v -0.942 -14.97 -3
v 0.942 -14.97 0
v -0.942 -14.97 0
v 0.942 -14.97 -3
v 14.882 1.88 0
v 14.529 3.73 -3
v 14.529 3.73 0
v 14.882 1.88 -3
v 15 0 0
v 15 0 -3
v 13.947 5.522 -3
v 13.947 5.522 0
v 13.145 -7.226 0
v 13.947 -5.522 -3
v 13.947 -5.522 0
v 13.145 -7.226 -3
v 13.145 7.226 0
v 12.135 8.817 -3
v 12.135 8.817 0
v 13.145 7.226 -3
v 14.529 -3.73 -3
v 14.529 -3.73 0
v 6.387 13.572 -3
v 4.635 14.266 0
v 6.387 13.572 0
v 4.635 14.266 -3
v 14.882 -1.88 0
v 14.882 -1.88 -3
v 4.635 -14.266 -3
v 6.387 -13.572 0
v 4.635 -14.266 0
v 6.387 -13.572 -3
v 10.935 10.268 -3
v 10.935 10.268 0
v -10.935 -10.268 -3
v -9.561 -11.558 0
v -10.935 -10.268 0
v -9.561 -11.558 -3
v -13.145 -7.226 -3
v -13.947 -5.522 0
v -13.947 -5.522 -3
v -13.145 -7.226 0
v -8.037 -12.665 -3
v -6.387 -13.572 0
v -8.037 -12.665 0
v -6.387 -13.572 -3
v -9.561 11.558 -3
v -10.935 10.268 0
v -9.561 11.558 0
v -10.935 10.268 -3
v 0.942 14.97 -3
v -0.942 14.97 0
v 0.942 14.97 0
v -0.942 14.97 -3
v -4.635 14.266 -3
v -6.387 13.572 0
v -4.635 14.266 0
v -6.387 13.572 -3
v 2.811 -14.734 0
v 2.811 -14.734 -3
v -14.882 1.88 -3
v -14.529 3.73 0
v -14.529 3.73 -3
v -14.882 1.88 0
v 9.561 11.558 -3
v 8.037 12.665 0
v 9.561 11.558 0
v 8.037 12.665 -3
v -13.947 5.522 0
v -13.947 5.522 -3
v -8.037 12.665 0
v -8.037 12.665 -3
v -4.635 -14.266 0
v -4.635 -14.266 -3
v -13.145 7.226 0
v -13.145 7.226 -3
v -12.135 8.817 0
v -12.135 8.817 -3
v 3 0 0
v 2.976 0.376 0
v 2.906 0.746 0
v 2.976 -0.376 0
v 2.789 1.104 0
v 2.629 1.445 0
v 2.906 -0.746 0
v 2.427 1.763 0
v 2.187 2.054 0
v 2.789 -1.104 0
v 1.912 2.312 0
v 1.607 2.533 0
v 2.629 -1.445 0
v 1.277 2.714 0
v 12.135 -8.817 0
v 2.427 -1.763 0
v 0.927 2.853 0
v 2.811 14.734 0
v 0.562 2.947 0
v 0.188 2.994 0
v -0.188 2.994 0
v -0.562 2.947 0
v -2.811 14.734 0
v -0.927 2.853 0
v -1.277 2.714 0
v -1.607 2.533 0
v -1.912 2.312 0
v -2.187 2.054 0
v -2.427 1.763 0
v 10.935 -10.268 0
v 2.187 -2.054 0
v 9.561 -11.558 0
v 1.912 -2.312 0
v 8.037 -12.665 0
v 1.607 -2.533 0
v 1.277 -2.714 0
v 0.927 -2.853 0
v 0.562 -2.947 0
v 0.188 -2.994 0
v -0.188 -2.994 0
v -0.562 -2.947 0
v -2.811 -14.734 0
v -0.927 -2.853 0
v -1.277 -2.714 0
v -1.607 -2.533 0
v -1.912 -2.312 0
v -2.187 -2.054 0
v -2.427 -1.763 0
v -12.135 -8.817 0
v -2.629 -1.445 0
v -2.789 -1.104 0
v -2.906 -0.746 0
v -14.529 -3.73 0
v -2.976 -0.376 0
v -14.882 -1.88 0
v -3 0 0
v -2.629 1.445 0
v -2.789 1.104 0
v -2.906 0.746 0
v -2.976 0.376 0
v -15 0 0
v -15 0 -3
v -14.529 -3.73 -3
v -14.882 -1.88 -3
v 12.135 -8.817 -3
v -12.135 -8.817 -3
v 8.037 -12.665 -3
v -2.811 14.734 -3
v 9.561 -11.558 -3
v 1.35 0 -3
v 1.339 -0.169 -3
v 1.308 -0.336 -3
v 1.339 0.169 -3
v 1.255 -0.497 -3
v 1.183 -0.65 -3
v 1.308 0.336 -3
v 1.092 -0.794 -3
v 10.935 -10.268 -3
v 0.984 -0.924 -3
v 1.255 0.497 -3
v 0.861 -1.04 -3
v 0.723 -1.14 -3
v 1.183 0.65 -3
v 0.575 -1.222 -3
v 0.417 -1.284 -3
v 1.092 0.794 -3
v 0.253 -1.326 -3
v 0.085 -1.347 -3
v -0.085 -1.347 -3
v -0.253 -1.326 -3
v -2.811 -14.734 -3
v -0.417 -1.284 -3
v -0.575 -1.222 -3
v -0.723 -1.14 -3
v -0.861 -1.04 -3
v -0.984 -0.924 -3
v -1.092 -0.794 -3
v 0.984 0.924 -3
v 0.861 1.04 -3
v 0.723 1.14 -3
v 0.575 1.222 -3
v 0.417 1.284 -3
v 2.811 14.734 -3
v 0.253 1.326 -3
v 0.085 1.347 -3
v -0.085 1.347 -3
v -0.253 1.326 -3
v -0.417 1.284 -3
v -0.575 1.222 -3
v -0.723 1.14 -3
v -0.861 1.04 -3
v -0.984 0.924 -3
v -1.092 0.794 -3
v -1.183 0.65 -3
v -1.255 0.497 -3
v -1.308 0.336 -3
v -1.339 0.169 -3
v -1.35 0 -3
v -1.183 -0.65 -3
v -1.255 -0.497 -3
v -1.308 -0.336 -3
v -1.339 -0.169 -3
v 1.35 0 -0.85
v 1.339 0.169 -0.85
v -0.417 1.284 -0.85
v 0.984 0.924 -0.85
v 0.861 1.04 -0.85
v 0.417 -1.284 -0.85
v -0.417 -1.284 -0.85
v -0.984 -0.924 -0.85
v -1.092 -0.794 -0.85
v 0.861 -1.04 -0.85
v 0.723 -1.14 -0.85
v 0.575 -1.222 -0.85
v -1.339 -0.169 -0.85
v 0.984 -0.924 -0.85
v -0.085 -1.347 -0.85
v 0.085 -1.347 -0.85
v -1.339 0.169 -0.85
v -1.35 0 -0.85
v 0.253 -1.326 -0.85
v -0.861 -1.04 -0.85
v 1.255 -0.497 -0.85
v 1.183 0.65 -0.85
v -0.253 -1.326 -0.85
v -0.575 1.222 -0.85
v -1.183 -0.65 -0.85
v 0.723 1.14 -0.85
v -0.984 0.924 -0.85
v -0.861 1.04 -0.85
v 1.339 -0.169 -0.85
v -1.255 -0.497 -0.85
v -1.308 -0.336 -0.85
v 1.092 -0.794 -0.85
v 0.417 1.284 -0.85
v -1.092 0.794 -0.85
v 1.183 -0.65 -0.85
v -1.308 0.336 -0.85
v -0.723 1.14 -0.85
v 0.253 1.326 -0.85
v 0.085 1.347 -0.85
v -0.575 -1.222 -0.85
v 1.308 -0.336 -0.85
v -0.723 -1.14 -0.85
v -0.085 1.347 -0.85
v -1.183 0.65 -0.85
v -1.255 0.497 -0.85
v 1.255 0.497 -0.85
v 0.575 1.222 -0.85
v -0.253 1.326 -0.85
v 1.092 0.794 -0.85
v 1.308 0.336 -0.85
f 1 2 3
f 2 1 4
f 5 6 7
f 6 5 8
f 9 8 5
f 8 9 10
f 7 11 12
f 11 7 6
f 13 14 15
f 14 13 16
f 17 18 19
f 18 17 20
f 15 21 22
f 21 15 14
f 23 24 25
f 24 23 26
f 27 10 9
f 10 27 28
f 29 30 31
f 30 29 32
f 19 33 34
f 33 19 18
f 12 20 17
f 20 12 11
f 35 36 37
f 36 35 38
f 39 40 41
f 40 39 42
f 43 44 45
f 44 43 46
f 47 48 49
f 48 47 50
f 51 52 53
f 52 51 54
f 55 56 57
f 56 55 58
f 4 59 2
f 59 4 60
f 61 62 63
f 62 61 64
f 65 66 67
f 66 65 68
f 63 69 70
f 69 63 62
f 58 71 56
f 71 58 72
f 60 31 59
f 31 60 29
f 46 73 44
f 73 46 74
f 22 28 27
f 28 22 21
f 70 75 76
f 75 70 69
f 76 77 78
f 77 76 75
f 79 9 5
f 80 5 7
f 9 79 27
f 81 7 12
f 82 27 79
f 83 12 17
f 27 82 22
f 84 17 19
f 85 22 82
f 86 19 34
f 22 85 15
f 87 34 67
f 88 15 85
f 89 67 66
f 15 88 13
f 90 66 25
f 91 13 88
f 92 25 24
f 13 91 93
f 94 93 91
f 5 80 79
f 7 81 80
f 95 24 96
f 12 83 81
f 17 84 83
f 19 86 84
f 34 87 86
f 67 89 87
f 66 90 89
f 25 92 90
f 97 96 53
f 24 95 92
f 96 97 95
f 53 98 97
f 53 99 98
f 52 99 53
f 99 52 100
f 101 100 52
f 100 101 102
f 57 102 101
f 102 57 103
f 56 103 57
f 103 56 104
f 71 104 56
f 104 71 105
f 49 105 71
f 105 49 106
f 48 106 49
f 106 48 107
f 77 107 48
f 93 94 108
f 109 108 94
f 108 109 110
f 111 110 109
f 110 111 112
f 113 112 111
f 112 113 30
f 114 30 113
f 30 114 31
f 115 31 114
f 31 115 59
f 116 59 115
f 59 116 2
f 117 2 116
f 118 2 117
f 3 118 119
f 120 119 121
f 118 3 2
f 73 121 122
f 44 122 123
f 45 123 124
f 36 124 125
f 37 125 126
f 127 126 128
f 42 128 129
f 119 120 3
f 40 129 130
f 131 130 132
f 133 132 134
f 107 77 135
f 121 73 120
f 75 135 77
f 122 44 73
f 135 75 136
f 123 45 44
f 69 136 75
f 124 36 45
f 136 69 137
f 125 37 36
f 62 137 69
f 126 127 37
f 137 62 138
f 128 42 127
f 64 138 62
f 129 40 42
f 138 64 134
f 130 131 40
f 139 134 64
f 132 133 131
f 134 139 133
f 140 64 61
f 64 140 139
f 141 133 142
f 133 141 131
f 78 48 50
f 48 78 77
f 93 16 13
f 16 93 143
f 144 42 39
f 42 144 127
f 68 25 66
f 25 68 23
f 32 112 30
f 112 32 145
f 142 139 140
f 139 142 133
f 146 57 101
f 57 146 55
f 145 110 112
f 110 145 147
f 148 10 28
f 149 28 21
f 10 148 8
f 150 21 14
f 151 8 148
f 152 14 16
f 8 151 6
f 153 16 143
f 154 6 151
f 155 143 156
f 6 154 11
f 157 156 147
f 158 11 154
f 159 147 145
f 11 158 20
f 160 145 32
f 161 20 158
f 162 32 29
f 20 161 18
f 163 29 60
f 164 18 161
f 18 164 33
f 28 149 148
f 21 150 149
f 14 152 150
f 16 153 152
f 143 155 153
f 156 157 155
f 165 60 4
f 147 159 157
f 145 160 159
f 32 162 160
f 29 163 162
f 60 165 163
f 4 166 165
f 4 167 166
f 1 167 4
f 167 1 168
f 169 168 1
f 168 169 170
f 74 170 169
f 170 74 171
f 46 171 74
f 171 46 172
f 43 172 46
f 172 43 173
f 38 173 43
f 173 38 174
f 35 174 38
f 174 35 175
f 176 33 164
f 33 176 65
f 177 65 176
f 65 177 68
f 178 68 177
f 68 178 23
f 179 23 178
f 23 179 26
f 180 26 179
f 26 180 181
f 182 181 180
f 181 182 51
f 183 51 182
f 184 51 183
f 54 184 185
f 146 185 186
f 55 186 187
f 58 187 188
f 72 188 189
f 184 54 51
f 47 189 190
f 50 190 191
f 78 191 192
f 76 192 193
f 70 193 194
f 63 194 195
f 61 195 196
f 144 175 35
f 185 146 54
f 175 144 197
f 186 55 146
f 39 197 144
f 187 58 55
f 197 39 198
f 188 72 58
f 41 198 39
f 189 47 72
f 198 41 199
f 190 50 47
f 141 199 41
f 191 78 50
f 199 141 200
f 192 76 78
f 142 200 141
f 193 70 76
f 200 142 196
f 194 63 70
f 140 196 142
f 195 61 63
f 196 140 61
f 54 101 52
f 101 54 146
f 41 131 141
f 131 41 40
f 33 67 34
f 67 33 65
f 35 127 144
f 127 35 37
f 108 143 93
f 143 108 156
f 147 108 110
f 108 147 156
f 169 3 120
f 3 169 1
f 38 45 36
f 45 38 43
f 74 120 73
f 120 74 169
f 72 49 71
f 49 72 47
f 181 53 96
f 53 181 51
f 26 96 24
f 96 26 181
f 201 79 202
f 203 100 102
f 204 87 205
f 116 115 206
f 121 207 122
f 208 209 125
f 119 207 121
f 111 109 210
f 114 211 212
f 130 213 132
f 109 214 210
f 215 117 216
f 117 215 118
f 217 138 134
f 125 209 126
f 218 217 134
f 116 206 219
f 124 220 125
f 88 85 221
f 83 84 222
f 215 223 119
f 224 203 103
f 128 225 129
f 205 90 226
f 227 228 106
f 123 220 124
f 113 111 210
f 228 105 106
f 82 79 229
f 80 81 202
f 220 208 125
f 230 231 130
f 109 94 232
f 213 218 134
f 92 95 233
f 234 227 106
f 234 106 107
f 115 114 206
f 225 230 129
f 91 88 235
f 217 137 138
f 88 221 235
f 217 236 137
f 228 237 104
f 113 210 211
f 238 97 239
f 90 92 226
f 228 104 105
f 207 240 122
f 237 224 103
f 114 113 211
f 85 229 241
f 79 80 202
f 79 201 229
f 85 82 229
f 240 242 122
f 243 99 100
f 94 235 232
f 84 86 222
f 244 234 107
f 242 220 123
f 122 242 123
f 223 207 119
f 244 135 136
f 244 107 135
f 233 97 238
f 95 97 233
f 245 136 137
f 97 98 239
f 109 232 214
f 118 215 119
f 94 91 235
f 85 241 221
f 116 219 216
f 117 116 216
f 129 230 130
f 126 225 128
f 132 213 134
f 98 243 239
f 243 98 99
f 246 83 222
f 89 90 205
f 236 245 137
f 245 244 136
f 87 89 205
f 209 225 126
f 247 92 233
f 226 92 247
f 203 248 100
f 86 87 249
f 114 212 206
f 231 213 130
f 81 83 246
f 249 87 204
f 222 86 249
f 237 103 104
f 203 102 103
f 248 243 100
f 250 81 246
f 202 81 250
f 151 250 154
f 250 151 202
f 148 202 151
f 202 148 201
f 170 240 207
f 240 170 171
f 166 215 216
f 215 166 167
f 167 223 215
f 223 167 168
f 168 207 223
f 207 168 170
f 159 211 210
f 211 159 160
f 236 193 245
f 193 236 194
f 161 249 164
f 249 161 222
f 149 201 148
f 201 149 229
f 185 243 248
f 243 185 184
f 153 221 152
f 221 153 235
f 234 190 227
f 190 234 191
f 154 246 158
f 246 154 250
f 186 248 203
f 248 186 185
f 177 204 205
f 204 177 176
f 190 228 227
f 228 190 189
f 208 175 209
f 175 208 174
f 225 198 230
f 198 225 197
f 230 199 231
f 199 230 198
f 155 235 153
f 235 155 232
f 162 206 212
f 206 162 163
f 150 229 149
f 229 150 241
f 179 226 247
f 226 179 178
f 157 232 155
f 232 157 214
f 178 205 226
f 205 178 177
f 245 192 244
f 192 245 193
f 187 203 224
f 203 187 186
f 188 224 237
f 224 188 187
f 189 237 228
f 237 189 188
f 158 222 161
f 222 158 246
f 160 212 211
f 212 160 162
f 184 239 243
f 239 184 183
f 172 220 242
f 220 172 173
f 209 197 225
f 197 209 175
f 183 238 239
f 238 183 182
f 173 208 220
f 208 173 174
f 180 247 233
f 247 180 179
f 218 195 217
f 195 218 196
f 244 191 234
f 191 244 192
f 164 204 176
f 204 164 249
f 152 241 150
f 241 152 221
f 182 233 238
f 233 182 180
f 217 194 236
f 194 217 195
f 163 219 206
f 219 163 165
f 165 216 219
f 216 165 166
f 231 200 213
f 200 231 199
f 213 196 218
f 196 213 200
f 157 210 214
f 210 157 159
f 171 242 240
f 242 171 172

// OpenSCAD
$fn = 50;


difference() {
	union() {
		translate(v = [0, 0, -3.0000000000]) {
			cylinder(h = 3, r = 15.0000000000);
		}
		translate(v = [0, 0, -3.0000000000]) {
			cylinder(h = 3, r = 2.8750000000);
		}
	}
	union() {
		translate(v = [0, 0, 0]) {
			rotate(a = [0, 0, 0]) {
				difference() {
					union() {
						translate(v = [0, 0, -3.0000000000]) {
							cylinder(h = 3, r = 1.0000000000);
						}
						translate(v = [0, 0, -0.8500000000]) {
							cylinder(h = 0.8500000000, r1 = 1.3500000000, r2 = 3.0000000000);
						}
						translate(v = [0, 0, -3.0000000000]) {
							cylinder(h = 3, r = 1.3500000000);
						}
						translate(v = [0, 0, -3.0000000000]) {
							cylinder(h = 3, r = 1.0000000000);
						}
					}
					union();
				}
			}
		}
	}
}
